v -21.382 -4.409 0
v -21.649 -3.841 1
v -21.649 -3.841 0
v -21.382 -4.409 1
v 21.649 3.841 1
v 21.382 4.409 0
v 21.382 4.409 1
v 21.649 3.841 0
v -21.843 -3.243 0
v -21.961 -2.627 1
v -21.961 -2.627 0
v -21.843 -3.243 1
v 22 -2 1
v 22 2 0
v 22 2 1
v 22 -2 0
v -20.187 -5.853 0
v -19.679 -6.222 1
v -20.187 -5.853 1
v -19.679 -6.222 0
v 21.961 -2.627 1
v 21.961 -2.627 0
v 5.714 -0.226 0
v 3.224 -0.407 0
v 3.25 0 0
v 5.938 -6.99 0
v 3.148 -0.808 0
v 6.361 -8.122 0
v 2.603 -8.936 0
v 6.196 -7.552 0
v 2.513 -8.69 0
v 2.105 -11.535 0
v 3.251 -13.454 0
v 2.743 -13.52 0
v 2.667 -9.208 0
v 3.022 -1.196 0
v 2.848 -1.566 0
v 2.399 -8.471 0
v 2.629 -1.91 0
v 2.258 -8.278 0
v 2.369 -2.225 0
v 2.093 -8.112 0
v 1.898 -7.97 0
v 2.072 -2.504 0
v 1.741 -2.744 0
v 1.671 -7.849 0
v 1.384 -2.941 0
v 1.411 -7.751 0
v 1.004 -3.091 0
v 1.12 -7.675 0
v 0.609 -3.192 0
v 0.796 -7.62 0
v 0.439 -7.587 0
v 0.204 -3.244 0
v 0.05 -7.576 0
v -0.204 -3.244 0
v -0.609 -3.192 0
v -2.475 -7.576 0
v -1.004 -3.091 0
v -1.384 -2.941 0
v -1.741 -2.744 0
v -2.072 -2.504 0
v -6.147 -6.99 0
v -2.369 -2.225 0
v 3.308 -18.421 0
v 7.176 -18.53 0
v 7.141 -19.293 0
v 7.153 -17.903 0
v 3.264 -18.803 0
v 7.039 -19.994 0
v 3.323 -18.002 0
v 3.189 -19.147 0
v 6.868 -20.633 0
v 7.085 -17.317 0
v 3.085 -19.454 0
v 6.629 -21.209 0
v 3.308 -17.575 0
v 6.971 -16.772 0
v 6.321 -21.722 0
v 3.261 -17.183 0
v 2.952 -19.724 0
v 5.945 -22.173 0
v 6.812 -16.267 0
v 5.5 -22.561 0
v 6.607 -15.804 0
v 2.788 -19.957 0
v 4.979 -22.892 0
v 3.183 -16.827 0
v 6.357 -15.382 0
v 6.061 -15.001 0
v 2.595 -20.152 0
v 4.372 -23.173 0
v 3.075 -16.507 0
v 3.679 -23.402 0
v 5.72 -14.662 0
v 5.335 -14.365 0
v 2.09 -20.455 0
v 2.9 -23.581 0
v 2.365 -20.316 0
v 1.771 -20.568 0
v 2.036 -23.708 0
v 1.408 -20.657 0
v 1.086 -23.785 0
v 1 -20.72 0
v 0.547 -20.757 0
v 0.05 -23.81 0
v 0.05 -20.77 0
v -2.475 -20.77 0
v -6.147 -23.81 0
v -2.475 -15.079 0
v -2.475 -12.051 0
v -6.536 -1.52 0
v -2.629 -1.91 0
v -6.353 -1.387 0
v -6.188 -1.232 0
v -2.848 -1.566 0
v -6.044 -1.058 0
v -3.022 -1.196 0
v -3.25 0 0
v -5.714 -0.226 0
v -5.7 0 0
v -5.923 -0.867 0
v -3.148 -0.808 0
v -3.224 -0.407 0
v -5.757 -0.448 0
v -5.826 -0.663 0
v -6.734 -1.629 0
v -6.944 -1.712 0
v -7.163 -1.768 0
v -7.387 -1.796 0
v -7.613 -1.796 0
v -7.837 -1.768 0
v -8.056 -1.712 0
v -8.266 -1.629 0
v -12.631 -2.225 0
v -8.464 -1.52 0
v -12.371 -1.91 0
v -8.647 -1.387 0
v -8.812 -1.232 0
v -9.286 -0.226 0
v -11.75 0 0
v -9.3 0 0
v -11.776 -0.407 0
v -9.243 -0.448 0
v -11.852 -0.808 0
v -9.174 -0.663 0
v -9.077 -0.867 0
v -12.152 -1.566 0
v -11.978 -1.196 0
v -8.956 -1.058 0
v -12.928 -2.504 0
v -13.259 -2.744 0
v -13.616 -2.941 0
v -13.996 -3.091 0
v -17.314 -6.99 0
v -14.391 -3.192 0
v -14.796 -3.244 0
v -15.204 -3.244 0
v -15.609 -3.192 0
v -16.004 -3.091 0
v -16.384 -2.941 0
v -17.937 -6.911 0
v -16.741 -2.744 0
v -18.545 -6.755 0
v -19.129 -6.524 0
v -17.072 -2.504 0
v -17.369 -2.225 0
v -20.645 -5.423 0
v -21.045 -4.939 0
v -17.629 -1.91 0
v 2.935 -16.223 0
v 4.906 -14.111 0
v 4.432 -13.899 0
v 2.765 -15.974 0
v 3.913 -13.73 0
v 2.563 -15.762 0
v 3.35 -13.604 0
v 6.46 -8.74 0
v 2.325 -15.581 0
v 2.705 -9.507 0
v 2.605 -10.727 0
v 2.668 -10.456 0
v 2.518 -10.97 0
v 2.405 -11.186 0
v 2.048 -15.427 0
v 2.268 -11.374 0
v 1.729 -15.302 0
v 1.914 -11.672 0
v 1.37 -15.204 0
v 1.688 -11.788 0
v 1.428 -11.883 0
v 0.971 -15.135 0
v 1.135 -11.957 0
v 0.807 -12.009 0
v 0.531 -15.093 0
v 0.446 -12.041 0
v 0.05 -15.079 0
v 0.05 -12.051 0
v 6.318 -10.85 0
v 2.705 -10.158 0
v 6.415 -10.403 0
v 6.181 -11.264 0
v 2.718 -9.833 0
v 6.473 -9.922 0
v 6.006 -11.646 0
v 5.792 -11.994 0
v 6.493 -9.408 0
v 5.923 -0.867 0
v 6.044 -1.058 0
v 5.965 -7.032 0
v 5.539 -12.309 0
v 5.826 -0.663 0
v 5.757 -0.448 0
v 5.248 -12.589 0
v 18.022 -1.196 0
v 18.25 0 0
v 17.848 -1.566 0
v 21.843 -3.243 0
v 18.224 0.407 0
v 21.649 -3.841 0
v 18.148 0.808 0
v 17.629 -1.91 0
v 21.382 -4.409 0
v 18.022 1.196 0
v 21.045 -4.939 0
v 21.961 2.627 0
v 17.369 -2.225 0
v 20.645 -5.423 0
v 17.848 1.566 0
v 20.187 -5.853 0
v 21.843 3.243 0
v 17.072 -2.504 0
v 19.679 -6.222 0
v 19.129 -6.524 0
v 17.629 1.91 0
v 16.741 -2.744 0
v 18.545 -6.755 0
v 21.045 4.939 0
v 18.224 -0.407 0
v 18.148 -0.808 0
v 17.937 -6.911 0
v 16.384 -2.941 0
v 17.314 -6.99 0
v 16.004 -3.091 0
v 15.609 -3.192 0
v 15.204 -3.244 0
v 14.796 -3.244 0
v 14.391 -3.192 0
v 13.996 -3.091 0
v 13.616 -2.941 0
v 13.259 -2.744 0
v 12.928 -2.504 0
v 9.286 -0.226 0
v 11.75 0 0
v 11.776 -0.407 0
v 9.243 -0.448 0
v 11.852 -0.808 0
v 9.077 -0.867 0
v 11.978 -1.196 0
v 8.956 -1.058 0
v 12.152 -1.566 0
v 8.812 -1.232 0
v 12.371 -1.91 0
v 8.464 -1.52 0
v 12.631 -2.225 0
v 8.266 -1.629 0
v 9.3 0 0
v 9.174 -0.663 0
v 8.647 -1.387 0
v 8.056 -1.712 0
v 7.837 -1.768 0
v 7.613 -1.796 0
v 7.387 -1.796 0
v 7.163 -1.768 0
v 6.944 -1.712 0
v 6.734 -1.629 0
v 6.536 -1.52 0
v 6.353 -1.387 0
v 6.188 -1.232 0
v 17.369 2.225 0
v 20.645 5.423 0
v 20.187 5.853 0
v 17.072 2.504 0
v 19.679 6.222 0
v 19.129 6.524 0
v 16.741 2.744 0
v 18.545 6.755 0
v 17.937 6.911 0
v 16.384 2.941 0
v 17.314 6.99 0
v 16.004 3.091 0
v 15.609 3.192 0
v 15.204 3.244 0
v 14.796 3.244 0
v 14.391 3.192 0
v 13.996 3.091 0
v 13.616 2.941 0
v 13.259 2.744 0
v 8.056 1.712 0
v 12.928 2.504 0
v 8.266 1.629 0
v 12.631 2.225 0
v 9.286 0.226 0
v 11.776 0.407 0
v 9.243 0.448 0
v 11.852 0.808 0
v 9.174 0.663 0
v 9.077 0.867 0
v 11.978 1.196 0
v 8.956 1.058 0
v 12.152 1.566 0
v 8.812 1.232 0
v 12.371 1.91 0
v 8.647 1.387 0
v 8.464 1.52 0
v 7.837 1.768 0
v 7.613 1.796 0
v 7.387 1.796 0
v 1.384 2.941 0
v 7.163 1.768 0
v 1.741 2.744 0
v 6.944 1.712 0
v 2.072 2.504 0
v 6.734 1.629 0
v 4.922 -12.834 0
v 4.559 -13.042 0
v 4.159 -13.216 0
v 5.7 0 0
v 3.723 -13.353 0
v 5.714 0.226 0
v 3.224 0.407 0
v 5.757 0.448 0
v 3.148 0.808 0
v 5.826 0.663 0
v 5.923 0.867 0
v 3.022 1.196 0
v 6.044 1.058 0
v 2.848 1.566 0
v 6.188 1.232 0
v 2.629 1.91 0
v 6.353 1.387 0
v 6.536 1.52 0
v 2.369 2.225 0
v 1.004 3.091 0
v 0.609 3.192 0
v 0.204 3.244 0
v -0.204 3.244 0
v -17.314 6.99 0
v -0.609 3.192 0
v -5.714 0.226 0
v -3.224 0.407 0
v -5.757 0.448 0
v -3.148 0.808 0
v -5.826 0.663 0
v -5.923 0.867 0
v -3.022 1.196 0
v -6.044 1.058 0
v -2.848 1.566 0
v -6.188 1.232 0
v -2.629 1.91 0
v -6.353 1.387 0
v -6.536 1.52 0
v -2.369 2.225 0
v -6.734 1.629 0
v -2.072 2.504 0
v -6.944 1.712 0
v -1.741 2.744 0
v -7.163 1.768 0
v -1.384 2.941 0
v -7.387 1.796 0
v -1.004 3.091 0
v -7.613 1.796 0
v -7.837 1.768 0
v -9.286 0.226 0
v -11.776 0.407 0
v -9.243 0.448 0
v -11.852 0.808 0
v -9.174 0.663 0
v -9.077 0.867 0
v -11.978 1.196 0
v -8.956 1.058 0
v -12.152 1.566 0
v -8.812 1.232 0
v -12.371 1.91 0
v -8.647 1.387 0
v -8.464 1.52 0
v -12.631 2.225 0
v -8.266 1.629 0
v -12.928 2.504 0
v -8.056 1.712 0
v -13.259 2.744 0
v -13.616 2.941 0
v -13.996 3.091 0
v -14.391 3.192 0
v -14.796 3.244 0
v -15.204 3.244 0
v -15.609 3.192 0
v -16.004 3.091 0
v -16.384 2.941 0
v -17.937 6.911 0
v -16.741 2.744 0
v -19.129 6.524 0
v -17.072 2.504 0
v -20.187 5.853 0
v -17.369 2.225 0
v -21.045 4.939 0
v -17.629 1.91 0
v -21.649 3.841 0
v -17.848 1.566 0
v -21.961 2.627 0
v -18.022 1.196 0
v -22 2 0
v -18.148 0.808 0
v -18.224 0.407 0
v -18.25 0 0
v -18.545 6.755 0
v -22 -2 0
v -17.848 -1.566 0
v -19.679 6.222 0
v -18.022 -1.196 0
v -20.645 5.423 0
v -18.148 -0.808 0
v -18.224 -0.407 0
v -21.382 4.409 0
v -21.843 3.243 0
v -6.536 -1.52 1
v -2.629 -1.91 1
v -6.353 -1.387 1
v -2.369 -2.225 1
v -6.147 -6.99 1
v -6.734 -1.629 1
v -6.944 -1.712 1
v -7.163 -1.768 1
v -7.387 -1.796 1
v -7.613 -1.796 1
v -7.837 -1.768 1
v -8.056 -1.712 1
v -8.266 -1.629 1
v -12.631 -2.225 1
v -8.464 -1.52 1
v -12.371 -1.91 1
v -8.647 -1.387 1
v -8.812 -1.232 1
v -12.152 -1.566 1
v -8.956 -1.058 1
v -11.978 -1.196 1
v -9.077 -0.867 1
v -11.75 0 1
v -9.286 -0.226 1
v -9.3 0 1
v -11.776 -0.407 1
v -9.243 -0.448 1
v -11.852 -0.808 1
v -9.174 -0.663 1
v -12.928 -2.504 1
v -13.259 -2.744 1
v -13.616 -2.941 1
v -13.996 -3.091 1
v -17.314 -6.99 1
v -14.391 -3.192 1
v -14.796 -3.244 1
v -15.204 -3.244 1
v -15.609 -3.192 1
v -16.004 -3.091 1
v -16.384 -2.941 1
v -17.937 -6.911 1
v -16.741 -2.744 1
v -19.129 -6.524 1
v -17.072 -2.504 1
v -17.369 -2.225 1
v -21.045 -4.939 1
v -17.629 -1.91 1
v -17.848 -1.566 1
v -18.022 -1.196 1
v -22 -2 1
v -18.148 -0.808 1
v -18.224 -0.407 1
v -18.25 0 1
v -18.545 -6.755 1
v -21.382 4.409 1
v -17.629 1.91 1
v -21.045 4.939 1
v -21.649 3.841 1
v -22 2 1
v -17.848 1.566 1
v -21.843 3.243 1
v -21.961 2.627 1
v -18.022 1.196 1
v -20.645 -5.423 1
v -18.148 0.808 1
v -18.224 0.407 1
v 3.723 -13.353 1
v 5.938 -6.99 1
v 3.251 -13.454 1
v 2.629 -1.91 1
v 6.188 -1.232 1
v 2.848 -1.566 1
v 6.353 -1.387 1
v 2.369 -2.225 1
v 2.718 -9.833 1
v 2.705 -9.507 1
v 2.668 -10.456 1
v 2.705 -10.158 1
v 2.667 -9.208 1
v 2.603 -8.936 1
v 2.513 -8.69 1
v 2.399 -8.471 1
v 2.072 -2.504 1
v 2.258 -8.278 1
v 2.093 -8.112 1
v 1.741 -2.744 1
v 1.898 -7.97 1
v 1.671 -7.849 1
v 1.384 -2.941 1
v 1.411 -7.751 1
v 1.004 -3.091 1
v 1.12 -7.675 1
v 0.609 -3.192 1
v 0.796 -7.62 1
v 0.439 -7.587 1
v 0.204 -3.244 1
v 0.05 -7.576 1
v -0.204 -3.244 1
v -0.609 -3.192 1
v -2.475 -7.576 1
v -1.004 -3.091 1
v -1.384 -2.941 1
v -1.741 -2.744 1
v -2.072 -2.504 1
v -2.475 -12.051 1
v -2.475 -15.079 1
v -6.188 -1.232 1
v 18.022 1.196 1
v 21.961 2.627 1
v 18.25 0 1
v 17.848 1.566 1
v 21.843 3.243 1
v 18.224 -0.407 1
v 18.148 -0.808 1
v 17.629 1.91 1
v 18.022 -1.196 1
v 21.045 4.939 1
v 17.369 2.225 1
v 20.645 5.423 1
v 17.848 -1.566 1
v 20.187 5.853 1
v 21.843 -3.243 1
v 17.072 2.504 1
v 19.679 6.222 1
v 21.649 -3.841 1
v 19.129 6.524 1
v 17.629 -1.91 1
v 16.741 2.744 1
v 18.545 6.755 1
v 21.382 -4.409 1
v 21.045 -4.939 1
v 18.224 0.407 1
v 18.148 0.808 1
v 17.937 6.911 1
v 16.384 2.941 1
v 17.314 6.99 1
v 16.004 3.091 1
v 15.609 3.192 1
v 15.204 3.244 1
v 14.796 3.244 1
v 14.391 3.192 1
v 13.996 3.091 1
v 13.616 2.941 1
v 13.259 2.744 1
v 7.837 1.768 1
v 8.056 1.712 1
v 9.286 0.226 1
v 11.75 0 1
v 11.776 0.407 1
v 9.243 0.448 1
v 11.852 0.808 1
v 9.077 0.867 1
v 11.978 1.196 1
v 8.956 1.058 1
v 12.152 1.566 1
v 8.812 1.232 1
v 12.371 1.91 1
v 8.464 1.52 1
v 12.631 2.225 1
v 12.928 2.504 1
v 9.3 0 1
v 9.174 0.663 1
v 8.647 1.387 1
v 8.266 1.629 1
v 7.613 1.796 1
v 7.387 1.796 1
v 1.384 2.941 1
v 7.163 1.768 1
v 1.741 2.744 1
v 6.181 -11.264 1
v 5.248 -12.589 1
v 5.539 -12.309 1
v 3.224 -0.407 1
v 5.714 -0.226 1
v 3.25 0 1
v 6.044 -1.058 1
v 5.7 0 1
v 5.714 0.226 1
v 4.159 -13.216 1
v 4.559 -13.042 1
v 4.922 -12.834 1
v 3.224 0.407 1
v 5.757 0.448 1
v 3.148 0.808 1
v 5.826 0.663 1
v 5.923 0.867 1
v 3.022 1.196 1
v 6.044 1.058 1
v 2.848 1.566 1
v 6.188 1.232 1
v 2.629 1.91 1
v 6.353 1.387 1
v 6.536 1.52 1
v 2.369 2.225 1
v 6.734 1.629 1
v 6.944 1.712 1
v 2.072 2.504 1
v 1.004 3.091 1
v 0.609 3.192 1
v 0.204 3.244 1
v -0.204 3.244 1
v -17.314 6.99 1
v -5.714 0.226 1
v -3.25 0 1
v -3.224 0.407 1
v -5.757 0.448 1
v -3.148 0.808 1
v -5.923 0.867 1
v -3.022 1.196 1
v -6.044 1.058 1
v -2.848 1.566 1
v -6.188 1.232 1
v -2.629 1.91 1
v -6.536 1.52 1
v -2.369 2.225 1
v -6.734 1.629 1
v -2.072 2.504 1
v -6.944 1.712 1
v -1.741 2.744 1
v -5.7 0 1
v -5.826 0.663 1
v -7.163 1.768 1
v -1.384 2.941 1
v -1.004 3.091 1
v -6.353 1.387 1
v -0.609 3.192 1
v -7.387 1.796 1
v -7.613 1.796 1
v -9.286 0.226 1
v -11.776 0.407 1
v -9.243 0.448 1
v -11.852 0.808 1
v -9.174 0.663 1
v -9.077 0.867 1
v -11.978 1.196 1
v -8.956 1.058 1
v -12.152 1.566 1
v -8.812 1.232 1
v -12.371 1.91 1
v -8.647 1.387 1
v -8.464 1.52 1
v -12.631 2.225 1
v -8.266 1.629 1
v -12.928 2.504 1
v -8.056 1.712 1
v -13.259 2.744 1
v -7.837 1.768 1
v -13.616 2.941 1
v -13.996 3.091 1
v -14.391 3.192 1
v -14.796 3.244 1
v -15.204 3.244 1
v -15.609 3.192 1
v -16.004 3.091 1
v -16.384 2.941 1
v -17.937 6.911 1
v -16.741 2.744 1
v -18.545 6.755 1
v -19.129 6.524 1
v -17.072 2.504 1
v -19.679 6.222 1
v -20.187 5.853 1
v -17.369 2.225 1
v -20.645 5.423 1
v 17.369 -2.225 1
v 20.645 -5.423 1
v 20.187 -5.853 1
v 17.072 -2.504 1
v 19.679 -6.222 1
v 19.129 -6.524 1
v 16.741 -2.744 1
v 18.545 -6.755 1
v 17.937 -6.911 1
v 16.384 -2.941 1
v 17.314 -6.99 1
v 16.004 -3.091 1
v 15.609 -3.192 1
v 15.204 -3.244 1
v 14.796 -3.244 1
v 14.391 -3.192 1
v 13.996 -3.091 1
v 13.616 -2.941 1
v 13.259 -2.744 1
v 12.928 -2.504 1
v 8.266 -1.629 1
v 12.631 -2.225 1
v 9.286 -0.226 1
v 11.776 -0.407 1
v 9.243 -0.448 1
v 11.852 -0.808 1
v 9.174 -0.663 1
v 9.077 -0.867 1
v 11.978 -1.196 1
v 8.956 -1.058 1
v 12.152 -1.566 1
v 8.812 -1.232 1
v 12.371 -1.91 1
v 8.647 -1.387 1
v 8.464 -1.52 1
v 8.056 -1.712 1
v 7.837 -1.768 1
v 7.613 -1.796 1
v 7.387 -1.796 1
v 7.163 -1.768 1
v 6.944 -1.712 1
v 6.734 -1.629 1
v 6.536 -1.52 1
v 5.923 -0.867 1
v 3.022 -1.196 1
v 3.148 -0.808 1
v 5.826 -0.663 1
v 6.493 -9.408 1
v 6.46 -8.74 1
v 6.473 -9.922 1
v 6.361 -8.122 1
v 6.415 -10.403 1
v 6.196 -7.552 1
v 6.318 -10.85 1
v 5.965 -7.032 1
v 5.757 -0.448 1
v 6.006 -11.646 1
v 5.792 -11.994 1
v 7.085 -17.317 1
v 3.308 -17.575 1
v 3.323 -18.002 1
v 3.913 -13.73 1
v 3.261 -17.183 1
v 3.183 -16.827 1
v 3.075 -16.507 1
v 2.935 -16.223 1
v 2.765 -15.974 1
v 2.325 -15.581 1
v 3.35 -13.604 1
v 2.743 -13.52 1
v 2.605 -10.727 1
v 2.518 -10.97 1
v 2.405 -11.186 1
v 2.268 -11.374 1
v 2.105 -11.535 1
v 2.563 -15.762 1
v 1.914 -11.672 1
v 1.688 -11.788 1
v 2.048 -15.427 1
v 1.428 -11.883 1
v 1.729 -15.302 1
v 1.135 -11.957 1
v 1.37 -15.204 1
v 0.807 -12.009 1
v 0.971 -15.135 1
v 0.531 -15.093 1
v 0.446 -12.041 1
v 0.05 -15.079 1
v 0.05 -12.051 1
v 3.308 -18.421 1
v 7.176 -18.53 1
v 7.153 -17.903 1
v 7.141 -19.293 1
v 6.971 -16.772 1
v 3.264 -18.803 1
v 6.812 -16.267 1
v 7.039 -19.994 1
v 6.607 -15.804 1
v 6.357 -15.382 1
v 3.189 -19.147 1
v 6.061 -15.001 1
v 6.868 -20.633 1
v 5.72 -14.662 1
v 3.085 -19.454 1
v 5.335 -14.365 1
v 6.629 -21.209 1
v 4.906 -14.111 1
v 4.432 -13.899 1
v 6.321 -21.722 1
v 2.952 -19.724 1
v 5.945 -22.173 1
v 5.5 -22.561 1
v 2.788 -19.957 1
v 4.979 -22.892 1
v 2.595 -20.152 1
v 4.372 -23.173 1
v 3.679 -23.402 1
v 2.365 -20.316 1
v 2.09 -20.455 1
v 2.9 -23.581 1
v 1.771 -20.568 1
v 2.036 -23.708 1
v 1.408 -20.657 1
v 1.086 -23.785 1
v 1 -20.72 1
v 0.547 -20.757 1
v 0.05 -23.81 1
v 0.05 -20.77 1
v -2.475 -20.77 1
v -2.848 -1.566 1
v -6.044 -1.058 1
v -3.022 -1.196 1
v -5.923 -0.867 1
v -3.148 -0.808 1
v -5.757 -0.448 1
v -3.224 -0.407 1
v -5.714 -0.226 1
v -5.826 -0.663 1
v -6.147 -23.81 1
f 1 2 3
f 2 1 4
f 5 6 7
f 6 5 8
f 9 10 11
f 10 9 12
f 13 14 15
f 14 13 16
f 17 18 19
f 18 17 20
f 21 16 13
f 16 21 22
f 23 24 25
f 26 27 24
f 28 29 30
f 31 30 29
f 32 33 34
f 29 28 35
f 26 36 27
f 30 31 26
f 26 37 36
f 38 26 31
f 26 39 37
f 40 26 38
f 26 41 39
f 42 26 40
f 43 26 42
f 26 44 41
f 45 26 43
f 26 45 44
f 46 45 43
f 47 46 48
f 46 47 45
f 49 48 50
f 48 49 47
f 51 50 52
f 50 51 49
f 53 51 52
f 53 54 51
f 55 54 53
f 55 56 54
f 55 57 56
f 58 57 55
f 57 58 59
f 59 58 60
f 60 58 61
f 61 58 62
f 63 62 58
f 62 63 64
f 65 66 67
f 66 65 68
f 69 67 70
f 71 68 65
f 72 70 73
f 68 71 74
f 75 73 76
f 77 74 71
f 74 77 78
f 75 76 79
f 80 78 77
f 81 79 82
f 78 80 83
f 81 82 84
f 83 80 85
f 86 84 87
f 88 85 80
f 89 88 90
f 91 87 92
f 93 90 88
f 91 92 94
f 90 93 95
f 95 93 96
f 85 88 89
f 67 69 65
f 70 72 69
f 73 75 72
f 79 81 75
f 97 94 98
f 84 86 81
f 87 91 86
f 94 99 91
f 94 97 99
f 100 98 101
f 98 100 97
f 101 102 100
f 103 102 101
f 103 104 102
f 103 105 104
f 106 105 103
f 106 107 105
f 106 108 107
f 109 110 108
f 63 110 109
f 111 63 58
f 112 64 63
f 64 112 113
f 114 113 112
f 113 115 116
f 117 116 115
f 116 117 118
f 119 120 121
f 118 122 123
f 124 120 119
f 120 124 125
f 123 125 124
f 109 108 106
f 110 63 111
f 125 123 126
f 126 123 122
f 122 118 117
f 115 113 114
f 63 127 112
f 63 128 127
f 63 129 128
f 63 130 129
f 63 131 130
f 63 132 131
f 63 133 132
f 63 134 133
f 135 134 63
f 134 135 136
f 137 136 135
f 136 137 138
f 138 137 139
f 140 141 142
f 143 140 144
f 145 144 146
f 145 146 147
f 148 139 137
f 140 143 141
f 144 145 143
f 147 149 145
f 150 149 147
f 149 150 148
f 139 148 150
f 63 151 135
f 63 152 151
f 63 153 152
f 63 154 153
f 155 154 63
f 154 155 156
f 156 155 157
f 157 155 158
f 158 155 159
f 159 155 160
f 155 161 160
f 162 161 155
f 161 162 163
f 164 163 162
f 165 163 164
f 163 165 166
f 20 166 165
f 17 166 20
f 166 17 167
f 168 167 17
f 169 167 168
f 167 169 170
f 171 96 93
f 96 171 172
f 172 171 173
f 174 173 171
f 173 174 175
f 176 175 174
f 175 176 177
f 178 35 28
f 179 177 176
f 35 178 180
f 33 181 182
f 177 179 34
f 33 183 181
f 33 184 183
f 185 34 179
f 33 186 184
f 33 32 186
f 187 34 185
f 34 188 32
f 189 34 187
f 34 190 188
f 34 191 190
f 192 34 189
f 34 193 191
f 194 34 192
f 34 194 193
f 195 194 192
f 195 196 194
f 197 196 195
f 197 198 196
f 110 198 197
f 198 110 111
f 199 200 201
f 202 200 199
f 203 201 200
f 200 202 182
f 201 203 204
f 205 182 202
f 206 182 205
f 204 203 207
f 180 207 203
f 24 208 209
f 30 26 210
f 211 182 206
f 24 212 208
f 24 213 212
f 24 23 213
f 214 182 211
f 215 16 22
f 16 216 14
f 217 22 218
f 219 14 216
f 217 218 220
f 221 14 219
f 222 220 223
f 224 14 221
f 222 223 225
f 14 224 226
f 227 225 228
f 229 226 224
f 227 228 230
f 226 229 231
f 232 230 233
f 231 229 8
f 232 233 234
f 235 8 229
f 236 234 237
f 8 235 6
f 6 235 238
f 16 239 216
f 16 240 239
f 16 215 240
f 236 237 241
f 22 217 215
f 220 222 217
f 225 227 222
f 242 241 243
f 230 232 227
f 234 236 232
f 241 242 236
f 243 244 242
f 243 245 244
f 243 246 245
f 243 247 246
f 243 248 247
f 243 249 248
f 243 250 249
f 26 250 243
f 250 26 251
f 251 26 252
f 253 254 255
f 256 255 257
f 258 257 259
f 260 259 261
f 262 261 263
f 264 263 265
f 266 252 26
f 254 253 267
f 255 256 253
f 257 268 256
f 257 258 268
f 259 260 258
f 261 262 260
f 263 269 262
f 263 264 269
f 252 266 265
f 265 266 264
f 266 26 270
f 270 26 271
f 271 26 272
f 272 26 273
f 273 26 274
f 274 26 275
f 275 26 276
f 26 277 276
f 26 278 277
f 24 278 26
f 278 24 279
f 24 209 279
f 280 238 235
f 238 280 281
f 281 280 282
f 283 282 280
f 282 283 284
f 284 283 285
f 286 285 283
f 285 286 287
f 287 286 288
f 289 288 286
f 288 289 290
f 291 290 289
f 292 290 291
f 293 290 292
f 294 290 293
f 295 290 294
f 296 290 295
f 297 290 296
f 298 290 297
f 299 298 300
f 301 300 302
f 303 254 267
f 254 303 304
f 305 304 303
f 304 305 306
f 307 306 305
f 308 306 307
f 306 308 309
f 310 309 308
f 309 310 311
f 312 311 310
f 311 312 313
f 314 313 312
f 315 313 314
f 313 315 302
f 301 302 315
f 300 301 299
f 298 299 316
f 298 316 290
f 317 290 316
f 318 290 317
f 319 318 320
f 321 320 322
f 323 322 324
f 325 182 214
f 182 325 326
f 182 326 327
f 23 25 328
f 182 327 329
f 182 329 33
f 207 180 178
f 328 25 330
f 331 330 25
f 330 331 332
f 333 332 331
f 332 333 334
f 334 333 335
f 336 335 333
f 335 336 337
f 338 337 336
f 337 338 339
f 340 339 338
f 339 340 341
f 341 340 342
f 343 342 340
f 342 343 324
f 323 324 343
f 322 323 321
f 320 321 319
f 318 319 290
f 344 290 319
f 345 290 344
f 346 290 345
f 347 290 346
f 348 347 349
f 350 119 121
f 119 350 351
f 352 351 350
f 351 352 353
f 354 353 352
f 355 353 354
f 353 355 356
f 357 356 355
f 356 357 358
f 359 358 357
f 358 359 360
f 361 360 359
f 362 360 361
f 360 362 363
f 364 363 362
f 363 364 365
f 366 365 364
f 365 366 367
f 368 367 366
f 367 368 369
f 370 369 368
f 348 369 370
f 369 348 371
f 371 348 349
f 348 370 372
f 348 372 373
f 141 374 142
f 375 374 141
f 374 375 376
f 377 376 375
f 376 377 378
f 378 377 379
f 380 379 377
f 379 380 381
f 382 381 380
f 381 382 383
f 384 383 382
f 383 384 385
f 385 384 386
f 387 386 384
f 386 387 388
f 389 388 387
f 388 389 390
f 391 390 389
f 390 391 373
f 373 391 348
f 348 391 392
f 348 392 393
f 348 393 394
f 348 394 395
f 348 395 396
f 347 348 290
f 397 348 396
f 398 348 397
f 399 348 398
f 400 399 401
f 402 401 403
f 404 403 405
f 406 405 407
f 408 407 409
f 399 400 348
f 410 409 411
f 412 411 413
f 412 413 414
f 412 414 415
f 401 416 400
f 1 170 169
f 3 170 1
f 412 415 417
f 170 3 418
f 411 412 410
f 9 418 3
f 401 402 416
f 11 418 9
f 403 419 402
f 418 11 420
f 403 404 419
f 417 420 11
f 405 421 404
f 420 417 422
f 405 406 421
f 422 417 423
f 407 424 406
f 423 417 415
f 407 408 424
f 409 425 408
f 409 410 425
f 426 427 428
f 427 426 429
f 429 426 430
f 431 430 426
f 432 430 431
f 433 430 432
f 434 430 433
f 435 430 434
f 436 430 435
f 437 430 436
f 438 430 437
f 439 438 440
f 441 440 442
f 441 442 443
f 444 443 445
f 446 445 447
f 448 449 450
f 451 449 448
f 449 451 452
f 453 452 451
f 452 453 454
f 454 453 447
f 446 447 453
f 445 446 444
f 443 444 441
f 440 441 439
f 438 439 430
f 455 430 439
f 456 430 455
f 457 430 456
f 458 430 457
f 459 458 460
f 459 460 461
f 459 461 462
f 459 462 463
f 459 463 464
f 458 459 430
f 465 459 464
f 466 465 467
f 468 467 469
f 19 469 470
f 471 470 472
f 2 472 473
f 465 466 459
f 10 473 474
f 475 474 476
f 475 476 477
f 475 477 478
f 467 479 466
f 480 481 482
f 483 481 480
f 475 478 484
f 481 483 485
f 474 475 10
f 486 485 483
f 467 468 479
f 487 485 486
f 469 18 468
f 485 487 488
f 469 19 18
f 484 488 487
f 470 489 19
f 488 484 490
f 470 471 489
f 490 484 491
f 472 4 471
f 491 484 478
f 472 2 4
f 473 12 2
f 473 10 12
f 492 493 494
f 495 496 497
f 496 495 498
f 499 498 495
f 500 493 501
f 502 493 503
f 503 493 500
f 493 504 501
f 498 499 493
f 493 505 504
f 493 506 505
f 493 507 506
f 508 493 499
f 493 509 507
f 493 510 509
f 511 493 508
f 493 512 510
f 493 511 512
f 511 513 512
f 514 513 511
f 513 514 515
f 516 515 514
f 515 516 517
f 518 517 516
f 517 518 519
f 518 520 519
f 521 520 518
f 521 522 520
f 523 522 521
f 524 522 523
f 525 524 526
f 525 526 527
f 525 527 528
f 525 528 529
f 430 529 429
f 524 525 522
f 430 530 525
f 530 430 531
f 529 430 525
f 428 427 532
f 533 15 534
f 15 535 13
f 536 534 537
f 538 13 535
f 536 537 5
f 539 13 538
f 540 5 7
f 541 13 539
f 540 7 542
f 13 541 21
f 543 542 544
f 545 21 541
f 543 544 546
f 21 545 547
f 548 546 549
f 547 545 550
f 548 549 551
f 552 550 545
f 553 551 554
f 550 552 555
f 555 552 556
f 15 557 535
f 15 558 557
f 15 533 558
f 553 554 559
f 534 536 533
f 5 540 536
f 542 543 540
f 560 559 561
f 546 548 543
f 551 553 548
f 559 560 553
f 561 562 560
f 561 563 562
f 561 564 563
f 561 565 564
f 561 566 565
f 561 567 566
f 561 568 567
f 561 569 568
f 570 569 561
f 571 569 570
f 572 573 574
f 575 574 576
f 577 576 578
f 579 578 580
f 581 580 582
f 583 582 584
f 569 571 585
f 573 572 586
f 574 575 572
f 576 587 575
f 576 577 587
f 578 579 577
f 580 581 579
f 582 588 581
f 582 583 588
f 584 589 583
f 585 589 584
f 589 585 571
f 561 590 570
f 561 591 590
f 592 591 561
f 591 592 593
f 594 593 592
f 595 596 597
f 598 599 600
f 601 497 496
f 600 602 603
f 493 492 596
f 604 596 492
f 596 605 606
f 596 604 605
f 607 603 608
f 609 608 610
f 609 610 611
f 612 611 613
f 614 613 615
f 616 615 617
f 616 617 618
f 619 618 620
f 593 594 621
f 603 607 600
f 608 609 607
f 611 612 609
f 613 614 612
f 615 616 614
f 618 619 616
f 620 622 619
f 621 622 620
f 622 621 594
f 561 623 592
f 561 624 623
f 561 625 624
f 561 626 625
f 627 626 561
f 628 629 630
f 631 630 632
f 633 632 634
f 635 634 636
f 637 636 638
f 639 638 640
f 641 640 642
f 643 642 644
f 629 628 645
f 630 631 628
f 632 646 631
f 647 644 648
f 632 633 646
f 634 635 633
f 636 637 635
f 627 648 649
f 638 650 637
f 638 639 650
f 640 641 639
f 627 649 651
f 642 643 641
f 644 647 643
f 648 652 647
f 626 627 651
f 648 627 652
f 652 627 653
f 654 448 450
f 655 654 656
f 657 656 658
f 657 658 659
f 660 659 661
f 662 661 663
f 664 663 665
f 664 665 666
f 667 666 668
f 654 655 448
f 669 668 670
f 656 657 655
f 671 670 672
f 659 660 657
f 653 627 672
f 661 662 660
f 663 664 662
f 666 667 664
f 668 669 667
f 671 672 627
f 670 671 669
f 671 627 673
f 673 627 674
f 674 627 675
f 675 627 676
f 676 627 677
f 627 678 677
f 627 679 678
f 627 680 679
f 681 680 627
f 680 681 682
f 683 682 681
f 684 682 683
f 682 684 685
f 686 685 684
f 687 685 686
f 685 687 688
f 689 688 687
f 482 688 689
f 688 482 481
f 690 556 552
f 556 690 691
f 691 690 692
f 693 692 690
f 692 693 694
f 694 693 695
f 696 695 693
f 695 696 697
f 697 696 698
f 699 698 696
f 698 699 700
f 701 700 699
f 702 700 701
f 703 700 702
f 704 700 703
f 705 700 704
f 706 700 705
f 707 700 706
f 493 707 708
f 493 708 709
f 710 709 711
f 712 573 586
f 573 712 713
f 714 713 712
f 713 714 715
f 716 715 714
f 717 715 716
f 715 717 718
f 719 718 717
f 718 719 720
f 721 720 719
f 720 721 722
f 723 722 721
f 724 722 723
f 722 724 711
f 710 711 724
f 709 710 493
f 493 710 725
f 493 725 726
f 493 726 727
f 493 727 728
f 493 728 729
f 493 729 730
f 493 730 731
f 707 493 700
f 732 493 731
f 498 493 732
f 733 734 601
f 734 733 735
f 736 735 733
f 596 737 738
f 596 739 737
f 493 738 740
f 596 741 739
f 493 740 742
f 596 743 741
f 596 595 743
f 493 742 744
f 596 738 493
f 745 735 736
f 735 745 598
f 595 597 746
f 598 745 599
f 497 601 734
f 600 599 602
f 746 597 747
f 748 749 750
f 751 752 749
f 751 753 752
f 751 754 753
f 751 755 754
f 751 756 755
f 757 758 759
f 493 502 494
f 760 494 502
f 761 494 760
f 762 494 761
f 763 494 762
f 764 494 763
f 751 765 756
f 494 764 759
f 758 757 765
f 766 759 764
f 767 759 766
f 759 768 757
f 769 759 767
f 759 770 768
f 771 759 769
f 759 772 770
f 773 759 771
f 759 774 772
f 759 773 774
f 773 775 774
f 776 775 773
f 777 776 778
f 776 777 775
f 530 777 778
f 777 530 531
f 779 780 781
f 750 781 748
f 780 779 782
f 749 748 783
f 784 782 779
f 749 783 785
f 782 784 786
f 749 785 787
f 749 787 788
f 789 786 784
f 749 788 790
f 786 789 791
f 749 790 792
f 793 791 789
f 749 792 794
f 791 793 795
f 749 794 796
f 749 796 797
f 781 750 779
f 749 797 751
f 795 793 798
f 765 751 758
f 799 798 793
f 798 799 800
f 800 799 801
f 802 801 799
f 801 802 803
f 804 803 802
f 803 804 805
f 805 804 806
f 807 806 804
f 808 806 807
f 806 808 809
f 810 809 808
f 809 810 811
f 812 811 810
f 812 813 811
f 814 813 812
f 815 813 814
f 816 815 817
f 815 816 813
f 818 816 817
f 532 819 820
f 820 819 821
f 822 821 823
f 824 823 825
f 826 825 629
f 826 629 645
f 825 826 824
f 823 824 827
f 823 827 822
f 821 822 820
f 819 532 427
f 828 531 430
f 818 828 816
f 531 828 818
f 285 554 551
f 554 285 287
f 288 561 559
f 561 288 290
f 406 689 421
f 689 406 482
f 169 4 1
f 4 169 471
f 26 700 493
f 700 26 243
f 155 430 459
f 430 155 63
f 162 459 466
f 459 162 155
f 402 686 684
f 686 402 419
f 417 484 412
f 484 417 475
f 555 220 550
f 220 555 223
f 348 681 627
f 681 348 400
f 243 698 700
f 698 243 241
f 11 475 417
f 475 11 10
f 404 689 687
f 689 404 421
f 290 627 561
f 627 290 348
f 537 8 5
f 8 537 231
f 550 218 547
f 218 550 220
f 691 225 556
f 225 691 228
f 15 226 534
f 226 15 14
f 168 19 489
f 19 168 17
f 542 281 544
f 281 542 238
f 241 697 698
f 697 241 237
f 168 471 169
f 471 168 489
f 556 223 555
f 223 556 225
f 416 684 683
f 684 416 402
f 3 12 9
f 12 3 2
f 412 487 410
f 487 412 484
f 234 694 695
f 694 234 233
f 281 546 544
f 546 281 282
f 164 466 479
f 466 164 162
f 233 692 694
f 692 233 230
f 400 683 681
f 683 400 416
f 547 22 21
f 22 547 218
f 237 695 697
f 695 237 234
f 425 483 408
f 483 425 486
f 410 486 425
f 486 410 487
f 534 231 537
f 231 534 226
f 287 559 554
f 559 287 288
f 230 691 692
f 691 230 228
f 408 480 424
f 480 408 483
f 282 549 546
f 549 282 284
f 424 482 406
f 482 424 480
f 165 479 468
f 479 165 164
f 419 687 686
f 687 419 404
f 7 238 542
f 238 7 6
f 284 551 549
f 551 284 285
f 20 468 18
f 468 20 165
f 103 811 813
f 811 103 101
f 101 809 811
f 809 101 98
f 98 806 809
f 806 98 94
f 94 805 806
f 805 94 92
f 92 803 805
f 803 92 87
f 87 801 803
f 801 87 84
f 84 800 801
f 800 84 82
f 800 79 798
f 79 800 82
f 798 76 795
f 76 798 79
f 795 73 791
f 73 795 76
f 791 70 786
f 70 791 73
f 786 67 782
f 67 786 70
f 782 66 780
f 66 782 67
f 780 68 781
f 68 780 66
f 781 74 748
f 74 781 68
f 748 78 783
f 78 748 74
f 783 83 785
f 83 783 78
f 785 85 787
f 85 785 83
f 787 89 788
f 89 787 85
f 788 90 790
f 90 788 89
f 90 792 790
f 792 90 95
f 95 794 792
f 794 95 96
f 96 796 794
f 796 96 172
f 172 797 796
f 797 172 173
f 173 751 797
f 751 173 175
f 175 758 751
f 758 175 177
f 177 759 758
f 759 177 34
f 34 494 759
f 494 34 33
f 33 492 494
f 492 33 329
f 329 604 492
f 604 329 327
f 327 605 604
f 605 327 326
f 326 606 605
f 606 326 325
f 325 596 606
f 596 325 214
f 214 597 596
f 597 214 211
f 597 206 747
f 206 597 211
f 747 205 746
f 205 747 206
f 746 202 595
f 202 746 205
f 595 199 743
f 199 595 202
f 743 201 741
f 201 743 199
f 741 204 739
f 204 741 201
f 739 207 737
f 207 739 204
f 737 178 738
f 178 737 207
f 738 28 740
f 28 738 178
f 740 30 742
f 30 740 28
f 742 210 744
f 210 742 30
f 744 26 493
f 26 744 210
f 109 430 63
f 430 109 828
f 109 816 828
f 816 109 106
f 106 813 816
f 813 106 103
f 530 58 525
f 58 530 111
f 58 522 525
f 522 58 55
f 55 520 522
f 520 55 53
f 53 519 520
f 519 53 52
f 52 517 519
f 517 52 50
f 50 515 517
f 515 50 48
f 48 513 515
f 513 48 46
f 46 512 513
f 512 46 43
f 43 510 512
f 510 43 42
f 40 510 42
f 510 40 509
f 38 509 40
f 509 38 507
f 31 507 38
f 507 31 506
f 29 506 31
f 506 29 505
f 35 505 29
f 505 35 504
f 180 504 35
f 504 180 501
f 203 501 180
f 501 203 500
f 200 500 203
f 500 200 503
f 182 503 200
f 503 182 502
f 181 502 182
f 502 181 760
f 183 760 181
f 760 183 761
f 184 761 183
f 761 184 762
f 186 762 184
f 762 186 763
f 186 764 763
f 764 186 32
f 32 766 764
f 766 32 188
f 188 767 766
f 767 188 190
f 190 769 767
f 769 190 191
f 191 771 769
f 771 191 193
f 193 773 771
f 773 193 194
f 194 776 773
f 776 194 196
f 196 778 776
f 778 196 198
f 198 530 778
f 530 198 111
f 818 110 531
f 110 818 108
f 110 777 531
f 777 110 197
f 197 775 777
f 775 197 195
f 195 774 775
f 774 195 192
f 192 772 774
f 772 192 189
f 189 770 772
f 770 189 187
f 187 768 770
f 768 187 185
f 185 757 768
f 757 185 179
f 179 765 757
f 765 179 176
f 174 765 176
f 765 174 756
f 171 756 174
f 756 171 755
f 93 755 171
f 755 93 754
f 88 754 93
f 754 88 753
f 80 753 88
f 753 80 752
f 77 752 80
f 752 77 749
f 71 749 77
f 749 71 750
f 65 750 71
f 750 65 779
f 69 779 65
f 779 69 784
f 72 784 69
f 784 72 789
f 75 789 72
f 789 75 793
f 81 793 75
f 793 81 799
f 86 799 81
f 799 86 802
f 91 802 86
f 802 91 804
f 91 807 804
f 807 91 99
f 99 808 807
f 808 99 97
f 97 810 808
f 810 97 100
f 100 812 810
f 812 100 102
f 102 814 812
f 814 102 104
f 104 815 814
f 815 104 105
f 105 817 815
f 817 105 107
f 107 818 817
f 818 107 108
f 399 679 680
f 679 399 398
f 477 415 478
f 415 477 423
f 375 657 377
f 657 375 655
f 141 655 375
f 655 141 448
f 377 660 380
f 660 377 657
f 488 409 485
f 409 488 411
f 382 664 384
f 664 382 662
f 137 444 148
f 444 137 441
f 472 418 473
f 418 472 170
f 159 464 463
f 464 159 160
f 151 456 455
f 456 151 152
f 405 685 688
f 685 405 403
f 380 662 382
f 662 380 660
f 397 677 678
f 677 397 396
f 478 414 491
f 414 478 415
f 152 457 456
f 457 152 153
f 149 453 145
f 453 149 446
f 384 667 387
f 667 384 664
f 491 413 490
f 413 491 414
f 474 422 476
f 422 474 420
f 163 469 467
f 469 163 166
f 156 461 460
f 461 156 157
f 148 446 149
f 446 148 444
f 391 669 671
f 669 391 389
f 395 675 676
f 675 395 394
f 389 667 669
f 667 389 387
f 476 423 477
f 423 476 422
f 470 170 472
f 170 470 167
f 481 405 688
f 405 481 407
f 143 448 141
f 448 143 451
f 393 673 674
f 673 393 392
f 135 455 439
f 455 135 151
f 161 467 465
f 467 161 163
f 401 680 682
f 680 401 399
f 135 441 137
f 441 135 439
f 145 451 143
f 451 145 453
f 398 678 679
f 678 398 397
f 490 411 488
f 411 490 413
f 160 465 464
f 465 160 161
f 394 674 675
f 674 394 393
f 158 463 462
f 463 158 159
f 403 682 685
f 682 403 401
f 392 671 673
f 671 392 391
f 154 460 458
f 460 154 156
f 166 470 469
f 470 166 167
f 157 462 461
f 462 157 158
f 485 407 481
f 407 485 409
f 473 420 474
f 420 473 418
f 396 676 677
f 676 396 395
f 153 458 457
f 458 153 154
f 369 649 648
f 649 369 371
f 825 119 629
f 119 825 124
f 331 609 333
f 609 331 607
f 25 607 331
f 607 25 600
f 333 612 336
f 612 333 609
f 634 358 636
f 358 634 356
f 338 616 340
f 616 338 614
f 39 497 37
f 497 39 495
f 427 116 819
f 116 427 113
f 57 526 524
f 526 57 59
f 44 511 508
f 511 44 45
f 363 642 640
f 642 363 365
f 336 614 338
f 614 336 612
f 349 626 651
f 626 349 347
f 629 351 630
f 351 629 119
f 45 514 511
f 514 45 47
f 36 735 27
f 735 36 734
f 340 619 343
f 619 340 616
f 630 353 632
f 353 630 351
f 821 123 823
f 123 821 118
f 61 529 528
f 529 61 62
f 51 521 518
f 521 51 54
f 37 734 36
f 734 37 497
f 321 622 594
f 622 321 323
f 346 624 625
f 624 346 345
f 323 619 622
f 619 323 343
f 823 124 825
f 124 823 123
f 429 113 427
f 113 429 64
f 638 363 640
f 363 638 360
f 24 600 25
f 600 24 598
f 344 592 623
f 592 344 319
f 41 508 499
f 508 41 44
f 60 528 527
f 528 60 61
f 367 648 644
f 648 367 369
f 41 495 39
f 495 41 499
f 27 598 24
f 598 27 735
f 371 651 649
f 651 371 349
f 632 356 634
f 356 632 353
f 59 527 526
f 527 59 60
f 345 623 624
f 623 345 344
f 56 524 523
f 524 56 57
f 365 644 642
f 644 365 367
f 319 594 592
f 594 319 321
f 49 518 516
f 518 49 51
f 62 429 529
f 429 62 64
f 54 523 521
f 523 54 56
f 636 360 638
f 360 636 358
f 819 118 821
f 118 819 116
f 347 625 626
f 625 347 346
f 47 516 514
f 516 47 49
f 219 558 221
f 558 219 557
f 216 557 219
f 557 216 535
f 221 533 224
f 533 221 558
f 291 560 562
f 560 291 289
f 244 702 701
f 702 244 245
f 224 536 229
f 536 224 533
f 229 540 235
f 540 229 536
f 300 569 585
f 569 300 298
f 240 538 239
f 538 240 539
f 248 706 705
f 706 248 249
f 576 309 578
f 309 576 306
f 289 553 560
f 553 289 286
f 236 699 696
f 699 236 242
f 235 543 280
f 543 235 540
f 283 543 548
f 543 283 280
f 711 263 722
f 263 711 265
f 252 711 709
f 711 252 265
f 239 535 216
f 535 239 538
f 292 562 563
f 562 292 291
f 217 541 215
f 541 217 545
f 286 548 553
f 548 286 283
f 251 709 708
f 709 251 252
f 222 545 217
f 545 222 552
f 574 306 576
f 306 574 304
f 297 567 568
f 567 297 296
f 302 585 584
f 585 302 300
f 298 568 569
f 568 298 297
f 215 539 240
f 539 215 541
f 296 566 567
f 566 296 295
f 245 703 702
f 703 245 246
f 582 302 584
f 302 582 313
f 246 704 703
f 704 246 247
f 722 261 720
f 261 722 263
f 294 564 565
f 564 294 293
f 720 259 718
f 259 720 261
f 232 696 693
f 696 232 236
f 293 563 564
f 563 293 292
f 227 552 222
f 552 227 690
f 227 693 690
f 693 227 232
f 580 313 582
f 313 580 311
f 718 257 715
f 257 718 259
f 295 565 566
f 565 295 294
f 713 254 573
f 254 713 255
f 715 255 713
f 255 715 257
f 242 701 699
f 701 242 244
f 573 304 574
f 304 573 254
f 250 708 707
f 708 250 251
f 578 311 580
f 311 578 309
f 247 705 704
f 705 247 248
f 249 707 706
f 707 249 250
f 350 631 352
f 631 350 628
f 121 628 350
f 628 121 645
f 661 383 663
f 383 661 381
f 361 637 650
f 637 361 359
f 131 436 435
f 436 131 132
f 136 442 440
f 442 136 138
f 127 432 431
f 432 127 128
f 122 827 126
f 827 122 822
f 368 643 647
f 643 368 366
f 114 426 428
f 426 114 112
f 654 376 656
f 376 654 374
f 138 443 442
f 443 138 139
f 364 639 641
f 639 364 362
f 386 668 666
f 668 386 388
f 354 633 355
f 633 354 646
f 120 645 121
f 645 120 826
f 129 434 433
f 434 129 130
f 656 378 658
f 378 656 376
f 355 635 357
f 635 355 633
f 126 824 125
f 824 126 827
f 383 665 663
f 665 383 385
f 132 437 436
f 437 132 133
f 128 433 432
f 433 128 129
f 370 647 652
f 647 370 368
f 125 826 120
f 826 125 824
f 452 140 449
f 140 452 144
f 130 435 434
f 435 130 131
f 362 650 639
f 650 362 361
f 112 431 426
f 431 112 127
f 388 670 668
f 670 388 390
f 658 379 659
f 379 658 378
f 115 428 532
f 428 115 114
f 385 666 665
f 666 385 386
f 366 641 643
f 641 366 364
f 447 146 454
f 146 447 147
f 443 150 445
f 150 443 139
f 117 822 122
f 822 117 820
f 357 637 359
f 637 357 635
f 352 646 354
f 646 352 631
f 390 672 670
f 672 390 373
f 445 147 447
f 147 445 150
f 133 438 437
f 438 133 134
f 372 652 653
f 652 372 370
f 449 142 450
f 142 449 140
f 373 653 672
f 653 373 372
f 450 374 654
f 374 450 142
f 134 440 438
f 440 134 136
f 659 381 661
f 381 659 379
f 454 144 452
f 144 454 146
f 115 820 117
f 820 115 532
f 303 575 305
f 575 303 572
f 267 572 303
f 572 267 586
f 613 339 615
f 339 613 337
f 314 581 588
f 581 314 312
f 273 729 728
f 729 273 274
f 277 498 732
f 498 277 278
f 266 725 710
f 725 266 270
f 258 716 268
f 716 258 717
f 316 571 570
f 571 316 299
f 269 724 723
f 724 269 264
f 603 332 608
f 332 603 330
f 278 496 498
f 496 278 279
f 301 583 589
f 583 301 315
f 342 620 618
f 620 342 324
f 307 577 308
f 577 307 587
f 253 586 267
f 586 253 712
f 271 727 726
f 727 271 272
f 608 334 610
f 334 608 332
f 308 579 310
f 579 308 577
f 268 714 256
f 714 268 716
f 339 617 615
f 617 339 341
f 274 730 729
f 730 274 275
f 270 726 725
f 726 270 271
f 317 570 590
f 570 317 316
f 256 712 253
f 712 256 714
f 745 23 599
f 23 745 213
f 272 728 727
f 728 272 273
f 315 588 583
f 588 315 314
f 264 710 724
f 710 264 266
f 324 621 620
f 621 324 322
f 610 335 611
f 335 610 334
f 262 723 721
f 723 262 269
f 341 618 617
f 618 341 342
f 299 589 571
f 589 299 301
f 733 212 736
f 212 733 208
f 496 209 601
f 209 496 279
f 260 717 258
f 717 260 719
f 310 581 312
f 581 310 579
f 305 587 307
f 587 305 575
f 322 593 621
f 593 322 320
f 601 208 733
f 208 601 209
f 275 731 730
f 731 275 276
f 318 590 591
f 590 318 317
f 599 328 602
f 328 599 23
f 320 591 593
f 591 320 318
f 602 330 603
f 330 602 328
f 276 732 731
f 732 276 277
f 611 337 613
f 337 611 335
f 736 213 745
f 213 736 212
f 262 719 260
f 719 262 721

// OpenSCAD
$fn = 50;


difference() {
	union() {
		hull() {
			translate(v = [-17.0000000000, 2.0000000000, 0]) {
				cylinder(h = 1, r = 5);
			}
			translate(v = [17.0000000000, 2.0000000000, 0]) {
				cylinder(h = 1, r = 5);
			}
			translate(v = [-17.0000000000, -2.0000000000, 0]) {
				cylinder(h = 1, r = 5);
			}
			translate(v = [17.0000000000, -2.0000000000, 0]) {
				cylinder(h = 1, r = 5);
			}
		}
		translate(v = [0, -5, 0]) {
			linear_extrude(height = 1) {
				text(font = "DejaVu Sans Mono:style=Bold", halign = "center", size = 19.0000000000, text = "B", valign = "top");
			}
		}
	}
	union() {
		translate(v = [-15.0000000000, 0.0000000000, 0]) {
			translate(v = [0, 0, -100]) {
				cylinder(h = 200, r = 3.2500000000);
			}
		}
		translate(v = [0, 0, -100]) {
			cylinder(h = 200, r = 3.2500000000);
		}
		translate(v = [15.0000000000, 0.0000000000, 0]) {
			translate(v = [0, 0, -100]) {
				cylinder(h = 200, r = 3.2500000000);
			}
		}
		translate(v = [-15.0000000000, 0.0000000000, 0]) {
			translate(v = [0, 0, -100]) {
				cylinder(h = 200, r = 1.8000000000);
			}
		}
		translate(v = [-7.5000000000, 0.0000000000, 0]) {
			translate(v = [0, 0, -100]) {
				cylinder(h = 200, r = 1.8000000000);
			}
		}
		translate(v = [0, 0, -100]) {
			cylinder(h = 200, r = 1.8000000000);
		}
		translate(v = [7.5000000000, 0.0000000000, 0]) {
			translate(v = [0, 0, -100]) {
				cylinder(h = 200, r = 1.8000000000);
			}
		}
		translate(v = [15.0000000000, 0.0000000000, 0]) {
			translate(v = [0, 0, -100]) {
				cylinder(h = 200, r = 1.8000000000);
			}
		}
	}
}
